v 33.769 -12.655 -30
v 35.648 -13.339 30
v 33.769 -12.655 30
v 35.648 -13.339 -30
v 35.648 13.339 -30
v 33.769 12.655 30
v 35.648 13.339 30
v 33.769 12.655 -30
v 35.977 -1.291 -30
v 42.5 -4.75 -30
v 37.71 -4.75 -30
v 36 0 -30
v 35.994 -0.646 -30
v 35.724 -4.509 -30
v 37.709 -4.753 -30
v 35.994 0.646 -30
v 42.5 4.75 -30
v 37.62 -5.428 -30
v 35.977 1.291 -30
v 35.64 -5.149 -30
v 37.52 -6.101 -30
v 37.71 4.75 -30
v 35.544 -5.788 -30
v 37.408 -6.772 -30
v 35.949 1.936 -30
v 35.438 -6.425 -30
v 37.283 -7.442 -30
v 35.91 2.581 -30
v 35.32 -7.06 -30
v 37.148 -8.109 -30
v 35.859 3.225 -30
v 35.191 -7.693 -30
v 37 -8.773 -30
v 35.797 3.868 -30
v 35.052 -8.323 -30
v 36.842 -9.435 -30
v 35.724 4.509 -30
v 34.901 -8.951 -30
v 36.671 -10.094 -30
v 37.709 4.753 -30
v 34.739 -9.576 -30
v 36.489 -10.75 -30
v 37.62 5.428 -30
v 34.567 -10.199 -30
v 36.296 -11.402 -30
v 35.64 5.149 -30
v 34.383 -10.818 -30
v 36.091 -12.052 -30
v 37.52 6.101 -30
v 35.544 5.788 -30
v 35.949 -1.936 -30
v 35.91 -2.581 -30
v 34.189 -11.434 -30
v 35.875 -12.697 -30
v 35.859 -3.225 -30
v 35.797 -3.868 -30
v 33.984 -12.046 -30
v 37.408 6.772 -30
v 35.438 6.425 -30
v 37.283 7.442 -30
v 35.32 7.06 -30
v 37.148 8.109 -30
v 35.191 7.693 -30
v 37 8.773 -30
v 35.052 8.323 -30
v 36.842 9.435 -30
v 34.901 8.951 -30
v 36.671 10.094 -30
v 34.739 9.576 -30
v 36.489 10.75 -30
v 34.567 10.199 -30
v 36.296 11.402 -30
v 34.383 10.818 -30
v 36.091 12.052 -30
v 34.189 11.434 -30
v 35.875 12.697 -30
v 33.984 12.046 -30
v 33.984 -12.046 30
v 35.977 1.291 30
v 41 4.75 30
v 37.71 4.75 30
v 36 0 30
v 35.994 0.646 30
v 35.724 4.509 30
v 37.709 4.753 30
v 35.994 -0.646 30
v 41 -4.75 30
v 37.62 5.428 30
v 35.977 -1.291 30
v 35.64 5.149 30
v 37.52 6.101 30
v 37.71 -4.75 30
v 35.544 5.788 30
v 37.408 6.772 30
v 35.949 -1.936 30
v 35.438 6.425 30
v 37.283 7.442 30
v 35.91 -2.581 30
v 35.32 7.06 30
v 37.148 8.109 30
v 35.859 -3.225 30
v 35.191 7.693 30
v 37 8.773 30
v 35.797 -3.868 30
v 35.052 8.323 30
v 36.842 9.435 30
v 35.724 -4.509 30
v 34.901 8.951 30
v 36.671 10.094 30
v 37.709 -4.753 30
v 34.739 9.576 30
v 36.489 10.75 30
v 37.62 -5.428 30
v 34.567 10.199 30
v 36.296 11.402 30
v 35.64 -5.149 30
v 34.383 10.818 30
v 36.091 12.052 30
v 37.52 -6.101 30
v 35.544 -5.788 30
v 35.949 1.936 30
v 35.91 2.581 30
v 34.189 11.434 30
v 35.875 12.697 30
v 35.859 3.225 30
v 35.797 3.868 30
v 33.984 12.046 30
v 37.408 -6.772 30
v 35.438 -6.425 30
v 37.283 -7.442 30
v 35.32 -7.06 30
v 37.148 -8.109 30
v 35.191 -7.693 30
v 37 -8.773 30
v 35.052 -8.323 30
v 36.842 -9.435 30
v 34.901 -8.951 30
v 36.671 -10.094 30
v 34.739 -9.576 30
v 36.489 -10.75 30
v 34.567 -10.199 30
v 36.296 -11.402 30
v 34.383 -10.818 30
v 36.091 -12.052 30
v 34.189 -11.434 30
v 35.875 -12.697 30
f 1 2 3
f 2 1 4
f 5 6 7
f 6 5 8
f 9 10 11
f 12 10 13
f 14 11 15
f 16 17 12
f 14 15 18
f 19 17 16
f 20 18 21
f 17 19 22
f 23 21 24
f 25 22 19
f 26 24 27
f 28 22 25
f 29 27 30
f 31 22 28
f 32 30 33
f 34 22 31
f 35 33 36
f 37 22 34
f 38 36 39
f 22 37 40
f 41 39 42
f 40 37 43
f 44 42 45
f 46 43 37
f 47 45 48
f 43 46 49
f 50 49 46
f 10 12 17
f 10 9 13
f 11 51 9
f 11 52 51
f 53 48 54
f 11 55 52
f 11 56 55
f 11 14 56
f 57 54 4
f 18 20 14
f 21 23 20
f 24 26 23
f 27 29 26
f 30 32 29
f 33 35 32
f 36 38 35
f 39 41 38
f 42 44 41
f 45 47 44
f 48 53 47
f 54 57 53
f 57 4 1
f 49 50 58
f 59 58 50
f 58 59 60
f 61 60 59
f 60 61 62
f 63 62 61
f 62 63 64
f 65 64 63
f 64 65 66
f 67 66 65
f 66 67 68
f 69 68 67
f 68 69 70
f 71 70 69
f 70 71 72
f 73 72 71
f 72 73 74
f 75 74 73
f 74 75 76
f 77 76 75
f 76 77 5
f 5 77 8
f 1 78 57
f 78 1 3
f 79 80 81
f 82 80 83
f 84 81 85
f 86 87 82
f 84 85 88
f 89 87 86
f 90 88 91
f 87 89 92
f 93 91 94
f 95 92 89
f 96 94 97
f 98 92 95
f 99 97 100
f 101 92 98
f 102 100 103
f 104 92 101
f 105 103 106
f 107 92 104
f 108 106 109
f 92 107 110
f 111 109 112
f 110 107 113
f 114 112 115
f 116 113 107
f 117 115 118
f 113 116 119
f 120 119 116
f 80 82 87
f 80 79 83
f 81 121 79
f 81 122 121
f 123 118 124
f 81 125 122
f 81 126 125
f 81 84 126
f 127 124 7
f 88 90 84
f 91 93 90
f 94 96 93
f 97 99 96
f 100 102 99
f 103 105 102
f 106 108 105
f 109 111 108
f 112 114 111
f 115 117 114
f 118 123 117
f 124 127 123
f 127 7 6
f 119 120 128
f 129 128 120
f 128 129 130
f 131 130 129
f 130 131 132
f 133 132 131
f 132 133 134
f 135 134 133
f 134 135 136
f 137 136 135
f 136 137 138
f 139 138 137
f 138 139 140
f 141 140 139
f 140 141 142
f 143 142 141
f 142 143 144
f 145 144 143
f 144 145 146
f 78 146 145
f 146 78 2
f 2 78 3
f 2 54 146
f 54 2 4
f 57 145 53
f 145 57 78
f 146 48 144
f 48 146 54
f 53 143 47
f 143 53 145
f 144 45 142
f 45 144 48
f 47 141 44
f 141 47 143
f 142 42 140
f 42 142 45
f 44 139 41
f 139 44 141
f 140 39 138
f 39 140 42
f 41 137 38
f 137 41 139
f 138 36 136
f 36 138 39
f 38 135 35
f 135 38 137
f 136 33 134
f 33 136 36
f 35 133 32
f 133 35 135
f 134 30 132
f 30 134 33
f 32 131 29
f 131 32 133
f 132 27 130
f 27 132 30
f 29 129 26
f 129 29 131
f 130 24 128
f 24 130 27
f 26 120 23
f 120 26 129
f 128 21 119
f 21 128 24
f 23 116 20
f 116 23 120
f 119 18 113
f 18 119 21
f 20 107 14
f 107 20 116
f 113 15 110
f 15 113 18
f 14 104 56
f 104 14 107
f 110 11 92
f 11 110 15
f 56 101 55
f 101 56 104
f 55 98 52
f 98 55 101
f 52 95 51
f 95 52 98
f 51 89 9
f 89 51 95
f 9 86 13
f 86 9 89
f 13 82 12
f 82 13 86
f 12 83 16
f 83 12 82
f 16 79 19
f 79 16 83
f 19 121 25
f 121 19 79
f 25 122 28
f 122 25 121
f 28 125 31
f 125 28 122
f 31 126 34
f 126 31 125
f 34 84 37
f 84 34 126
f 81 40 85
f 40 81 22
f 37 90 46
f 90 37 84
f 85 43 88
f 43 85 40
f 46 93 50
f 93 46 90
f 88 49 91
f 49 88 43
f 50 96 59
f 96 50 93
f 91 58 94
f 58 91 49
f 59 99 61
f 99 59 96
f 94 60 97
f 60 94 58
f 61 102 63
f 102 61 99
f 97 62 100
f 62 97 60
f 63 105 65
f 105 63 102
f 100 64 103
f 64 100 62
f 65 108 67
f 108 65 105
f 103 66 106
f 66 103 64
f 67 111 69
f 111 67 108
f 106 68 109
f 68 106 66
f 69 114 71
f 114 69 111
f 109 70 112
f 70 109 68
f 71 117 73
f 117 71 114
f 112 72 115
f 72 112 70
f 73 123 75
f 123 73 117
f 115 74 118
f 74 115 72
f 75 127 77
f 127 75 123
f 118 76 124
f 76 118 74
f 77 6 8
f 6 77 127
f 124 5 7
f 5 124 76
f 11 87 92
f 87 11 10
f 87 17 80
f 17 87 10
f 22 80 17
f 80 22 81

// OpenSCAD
inner_d = 74;
t=2;
height = 60;

wedge_x1 = 0;
wedge_x2 = 5;
wedge_x3 = 3.5;
wedge_y = 10-0.5;

module wedge() {
    polyhedron(
        points=[
                [wedge_x1,-wedge_y/2,-height/2],
                [wedge_x2,-wedge_y/2,-height/2],
                [wedge_x3,-wedge_y/2,height/2],
                [wedge_x1,-wedge_y/2,height/2],
                [wedge_x1,wedge_y/2,-height/2],
                [wedge_x2,wedge_y/2,-height/2],
                [wedge_x3,wedge_y/2,height/2],
                [wedge_x1,wedge_y/2,height/2],
              ],
        faces =[
                [0,3,2,1],
                [1,2,6,5],
                [5,6,7,4],
                [4,7,3,0],
                [6,2,3,7],
                [0,1,5,4],
            
    ]);
}

union() {
    translate([-1, 0, 0])  rotate([0, 0, -20]) rotate_extrude(angle=40,$fn = 360) { polygon( 
            points=[
                [inner_d/2,-height/2],
                [inner_d/2+t,-height/2],
                [inner_d/2+t,height/2],
                [inner_d/2,height/2],
            ] 
    );}
    translate([37.5,0,0]) wedge();
}
